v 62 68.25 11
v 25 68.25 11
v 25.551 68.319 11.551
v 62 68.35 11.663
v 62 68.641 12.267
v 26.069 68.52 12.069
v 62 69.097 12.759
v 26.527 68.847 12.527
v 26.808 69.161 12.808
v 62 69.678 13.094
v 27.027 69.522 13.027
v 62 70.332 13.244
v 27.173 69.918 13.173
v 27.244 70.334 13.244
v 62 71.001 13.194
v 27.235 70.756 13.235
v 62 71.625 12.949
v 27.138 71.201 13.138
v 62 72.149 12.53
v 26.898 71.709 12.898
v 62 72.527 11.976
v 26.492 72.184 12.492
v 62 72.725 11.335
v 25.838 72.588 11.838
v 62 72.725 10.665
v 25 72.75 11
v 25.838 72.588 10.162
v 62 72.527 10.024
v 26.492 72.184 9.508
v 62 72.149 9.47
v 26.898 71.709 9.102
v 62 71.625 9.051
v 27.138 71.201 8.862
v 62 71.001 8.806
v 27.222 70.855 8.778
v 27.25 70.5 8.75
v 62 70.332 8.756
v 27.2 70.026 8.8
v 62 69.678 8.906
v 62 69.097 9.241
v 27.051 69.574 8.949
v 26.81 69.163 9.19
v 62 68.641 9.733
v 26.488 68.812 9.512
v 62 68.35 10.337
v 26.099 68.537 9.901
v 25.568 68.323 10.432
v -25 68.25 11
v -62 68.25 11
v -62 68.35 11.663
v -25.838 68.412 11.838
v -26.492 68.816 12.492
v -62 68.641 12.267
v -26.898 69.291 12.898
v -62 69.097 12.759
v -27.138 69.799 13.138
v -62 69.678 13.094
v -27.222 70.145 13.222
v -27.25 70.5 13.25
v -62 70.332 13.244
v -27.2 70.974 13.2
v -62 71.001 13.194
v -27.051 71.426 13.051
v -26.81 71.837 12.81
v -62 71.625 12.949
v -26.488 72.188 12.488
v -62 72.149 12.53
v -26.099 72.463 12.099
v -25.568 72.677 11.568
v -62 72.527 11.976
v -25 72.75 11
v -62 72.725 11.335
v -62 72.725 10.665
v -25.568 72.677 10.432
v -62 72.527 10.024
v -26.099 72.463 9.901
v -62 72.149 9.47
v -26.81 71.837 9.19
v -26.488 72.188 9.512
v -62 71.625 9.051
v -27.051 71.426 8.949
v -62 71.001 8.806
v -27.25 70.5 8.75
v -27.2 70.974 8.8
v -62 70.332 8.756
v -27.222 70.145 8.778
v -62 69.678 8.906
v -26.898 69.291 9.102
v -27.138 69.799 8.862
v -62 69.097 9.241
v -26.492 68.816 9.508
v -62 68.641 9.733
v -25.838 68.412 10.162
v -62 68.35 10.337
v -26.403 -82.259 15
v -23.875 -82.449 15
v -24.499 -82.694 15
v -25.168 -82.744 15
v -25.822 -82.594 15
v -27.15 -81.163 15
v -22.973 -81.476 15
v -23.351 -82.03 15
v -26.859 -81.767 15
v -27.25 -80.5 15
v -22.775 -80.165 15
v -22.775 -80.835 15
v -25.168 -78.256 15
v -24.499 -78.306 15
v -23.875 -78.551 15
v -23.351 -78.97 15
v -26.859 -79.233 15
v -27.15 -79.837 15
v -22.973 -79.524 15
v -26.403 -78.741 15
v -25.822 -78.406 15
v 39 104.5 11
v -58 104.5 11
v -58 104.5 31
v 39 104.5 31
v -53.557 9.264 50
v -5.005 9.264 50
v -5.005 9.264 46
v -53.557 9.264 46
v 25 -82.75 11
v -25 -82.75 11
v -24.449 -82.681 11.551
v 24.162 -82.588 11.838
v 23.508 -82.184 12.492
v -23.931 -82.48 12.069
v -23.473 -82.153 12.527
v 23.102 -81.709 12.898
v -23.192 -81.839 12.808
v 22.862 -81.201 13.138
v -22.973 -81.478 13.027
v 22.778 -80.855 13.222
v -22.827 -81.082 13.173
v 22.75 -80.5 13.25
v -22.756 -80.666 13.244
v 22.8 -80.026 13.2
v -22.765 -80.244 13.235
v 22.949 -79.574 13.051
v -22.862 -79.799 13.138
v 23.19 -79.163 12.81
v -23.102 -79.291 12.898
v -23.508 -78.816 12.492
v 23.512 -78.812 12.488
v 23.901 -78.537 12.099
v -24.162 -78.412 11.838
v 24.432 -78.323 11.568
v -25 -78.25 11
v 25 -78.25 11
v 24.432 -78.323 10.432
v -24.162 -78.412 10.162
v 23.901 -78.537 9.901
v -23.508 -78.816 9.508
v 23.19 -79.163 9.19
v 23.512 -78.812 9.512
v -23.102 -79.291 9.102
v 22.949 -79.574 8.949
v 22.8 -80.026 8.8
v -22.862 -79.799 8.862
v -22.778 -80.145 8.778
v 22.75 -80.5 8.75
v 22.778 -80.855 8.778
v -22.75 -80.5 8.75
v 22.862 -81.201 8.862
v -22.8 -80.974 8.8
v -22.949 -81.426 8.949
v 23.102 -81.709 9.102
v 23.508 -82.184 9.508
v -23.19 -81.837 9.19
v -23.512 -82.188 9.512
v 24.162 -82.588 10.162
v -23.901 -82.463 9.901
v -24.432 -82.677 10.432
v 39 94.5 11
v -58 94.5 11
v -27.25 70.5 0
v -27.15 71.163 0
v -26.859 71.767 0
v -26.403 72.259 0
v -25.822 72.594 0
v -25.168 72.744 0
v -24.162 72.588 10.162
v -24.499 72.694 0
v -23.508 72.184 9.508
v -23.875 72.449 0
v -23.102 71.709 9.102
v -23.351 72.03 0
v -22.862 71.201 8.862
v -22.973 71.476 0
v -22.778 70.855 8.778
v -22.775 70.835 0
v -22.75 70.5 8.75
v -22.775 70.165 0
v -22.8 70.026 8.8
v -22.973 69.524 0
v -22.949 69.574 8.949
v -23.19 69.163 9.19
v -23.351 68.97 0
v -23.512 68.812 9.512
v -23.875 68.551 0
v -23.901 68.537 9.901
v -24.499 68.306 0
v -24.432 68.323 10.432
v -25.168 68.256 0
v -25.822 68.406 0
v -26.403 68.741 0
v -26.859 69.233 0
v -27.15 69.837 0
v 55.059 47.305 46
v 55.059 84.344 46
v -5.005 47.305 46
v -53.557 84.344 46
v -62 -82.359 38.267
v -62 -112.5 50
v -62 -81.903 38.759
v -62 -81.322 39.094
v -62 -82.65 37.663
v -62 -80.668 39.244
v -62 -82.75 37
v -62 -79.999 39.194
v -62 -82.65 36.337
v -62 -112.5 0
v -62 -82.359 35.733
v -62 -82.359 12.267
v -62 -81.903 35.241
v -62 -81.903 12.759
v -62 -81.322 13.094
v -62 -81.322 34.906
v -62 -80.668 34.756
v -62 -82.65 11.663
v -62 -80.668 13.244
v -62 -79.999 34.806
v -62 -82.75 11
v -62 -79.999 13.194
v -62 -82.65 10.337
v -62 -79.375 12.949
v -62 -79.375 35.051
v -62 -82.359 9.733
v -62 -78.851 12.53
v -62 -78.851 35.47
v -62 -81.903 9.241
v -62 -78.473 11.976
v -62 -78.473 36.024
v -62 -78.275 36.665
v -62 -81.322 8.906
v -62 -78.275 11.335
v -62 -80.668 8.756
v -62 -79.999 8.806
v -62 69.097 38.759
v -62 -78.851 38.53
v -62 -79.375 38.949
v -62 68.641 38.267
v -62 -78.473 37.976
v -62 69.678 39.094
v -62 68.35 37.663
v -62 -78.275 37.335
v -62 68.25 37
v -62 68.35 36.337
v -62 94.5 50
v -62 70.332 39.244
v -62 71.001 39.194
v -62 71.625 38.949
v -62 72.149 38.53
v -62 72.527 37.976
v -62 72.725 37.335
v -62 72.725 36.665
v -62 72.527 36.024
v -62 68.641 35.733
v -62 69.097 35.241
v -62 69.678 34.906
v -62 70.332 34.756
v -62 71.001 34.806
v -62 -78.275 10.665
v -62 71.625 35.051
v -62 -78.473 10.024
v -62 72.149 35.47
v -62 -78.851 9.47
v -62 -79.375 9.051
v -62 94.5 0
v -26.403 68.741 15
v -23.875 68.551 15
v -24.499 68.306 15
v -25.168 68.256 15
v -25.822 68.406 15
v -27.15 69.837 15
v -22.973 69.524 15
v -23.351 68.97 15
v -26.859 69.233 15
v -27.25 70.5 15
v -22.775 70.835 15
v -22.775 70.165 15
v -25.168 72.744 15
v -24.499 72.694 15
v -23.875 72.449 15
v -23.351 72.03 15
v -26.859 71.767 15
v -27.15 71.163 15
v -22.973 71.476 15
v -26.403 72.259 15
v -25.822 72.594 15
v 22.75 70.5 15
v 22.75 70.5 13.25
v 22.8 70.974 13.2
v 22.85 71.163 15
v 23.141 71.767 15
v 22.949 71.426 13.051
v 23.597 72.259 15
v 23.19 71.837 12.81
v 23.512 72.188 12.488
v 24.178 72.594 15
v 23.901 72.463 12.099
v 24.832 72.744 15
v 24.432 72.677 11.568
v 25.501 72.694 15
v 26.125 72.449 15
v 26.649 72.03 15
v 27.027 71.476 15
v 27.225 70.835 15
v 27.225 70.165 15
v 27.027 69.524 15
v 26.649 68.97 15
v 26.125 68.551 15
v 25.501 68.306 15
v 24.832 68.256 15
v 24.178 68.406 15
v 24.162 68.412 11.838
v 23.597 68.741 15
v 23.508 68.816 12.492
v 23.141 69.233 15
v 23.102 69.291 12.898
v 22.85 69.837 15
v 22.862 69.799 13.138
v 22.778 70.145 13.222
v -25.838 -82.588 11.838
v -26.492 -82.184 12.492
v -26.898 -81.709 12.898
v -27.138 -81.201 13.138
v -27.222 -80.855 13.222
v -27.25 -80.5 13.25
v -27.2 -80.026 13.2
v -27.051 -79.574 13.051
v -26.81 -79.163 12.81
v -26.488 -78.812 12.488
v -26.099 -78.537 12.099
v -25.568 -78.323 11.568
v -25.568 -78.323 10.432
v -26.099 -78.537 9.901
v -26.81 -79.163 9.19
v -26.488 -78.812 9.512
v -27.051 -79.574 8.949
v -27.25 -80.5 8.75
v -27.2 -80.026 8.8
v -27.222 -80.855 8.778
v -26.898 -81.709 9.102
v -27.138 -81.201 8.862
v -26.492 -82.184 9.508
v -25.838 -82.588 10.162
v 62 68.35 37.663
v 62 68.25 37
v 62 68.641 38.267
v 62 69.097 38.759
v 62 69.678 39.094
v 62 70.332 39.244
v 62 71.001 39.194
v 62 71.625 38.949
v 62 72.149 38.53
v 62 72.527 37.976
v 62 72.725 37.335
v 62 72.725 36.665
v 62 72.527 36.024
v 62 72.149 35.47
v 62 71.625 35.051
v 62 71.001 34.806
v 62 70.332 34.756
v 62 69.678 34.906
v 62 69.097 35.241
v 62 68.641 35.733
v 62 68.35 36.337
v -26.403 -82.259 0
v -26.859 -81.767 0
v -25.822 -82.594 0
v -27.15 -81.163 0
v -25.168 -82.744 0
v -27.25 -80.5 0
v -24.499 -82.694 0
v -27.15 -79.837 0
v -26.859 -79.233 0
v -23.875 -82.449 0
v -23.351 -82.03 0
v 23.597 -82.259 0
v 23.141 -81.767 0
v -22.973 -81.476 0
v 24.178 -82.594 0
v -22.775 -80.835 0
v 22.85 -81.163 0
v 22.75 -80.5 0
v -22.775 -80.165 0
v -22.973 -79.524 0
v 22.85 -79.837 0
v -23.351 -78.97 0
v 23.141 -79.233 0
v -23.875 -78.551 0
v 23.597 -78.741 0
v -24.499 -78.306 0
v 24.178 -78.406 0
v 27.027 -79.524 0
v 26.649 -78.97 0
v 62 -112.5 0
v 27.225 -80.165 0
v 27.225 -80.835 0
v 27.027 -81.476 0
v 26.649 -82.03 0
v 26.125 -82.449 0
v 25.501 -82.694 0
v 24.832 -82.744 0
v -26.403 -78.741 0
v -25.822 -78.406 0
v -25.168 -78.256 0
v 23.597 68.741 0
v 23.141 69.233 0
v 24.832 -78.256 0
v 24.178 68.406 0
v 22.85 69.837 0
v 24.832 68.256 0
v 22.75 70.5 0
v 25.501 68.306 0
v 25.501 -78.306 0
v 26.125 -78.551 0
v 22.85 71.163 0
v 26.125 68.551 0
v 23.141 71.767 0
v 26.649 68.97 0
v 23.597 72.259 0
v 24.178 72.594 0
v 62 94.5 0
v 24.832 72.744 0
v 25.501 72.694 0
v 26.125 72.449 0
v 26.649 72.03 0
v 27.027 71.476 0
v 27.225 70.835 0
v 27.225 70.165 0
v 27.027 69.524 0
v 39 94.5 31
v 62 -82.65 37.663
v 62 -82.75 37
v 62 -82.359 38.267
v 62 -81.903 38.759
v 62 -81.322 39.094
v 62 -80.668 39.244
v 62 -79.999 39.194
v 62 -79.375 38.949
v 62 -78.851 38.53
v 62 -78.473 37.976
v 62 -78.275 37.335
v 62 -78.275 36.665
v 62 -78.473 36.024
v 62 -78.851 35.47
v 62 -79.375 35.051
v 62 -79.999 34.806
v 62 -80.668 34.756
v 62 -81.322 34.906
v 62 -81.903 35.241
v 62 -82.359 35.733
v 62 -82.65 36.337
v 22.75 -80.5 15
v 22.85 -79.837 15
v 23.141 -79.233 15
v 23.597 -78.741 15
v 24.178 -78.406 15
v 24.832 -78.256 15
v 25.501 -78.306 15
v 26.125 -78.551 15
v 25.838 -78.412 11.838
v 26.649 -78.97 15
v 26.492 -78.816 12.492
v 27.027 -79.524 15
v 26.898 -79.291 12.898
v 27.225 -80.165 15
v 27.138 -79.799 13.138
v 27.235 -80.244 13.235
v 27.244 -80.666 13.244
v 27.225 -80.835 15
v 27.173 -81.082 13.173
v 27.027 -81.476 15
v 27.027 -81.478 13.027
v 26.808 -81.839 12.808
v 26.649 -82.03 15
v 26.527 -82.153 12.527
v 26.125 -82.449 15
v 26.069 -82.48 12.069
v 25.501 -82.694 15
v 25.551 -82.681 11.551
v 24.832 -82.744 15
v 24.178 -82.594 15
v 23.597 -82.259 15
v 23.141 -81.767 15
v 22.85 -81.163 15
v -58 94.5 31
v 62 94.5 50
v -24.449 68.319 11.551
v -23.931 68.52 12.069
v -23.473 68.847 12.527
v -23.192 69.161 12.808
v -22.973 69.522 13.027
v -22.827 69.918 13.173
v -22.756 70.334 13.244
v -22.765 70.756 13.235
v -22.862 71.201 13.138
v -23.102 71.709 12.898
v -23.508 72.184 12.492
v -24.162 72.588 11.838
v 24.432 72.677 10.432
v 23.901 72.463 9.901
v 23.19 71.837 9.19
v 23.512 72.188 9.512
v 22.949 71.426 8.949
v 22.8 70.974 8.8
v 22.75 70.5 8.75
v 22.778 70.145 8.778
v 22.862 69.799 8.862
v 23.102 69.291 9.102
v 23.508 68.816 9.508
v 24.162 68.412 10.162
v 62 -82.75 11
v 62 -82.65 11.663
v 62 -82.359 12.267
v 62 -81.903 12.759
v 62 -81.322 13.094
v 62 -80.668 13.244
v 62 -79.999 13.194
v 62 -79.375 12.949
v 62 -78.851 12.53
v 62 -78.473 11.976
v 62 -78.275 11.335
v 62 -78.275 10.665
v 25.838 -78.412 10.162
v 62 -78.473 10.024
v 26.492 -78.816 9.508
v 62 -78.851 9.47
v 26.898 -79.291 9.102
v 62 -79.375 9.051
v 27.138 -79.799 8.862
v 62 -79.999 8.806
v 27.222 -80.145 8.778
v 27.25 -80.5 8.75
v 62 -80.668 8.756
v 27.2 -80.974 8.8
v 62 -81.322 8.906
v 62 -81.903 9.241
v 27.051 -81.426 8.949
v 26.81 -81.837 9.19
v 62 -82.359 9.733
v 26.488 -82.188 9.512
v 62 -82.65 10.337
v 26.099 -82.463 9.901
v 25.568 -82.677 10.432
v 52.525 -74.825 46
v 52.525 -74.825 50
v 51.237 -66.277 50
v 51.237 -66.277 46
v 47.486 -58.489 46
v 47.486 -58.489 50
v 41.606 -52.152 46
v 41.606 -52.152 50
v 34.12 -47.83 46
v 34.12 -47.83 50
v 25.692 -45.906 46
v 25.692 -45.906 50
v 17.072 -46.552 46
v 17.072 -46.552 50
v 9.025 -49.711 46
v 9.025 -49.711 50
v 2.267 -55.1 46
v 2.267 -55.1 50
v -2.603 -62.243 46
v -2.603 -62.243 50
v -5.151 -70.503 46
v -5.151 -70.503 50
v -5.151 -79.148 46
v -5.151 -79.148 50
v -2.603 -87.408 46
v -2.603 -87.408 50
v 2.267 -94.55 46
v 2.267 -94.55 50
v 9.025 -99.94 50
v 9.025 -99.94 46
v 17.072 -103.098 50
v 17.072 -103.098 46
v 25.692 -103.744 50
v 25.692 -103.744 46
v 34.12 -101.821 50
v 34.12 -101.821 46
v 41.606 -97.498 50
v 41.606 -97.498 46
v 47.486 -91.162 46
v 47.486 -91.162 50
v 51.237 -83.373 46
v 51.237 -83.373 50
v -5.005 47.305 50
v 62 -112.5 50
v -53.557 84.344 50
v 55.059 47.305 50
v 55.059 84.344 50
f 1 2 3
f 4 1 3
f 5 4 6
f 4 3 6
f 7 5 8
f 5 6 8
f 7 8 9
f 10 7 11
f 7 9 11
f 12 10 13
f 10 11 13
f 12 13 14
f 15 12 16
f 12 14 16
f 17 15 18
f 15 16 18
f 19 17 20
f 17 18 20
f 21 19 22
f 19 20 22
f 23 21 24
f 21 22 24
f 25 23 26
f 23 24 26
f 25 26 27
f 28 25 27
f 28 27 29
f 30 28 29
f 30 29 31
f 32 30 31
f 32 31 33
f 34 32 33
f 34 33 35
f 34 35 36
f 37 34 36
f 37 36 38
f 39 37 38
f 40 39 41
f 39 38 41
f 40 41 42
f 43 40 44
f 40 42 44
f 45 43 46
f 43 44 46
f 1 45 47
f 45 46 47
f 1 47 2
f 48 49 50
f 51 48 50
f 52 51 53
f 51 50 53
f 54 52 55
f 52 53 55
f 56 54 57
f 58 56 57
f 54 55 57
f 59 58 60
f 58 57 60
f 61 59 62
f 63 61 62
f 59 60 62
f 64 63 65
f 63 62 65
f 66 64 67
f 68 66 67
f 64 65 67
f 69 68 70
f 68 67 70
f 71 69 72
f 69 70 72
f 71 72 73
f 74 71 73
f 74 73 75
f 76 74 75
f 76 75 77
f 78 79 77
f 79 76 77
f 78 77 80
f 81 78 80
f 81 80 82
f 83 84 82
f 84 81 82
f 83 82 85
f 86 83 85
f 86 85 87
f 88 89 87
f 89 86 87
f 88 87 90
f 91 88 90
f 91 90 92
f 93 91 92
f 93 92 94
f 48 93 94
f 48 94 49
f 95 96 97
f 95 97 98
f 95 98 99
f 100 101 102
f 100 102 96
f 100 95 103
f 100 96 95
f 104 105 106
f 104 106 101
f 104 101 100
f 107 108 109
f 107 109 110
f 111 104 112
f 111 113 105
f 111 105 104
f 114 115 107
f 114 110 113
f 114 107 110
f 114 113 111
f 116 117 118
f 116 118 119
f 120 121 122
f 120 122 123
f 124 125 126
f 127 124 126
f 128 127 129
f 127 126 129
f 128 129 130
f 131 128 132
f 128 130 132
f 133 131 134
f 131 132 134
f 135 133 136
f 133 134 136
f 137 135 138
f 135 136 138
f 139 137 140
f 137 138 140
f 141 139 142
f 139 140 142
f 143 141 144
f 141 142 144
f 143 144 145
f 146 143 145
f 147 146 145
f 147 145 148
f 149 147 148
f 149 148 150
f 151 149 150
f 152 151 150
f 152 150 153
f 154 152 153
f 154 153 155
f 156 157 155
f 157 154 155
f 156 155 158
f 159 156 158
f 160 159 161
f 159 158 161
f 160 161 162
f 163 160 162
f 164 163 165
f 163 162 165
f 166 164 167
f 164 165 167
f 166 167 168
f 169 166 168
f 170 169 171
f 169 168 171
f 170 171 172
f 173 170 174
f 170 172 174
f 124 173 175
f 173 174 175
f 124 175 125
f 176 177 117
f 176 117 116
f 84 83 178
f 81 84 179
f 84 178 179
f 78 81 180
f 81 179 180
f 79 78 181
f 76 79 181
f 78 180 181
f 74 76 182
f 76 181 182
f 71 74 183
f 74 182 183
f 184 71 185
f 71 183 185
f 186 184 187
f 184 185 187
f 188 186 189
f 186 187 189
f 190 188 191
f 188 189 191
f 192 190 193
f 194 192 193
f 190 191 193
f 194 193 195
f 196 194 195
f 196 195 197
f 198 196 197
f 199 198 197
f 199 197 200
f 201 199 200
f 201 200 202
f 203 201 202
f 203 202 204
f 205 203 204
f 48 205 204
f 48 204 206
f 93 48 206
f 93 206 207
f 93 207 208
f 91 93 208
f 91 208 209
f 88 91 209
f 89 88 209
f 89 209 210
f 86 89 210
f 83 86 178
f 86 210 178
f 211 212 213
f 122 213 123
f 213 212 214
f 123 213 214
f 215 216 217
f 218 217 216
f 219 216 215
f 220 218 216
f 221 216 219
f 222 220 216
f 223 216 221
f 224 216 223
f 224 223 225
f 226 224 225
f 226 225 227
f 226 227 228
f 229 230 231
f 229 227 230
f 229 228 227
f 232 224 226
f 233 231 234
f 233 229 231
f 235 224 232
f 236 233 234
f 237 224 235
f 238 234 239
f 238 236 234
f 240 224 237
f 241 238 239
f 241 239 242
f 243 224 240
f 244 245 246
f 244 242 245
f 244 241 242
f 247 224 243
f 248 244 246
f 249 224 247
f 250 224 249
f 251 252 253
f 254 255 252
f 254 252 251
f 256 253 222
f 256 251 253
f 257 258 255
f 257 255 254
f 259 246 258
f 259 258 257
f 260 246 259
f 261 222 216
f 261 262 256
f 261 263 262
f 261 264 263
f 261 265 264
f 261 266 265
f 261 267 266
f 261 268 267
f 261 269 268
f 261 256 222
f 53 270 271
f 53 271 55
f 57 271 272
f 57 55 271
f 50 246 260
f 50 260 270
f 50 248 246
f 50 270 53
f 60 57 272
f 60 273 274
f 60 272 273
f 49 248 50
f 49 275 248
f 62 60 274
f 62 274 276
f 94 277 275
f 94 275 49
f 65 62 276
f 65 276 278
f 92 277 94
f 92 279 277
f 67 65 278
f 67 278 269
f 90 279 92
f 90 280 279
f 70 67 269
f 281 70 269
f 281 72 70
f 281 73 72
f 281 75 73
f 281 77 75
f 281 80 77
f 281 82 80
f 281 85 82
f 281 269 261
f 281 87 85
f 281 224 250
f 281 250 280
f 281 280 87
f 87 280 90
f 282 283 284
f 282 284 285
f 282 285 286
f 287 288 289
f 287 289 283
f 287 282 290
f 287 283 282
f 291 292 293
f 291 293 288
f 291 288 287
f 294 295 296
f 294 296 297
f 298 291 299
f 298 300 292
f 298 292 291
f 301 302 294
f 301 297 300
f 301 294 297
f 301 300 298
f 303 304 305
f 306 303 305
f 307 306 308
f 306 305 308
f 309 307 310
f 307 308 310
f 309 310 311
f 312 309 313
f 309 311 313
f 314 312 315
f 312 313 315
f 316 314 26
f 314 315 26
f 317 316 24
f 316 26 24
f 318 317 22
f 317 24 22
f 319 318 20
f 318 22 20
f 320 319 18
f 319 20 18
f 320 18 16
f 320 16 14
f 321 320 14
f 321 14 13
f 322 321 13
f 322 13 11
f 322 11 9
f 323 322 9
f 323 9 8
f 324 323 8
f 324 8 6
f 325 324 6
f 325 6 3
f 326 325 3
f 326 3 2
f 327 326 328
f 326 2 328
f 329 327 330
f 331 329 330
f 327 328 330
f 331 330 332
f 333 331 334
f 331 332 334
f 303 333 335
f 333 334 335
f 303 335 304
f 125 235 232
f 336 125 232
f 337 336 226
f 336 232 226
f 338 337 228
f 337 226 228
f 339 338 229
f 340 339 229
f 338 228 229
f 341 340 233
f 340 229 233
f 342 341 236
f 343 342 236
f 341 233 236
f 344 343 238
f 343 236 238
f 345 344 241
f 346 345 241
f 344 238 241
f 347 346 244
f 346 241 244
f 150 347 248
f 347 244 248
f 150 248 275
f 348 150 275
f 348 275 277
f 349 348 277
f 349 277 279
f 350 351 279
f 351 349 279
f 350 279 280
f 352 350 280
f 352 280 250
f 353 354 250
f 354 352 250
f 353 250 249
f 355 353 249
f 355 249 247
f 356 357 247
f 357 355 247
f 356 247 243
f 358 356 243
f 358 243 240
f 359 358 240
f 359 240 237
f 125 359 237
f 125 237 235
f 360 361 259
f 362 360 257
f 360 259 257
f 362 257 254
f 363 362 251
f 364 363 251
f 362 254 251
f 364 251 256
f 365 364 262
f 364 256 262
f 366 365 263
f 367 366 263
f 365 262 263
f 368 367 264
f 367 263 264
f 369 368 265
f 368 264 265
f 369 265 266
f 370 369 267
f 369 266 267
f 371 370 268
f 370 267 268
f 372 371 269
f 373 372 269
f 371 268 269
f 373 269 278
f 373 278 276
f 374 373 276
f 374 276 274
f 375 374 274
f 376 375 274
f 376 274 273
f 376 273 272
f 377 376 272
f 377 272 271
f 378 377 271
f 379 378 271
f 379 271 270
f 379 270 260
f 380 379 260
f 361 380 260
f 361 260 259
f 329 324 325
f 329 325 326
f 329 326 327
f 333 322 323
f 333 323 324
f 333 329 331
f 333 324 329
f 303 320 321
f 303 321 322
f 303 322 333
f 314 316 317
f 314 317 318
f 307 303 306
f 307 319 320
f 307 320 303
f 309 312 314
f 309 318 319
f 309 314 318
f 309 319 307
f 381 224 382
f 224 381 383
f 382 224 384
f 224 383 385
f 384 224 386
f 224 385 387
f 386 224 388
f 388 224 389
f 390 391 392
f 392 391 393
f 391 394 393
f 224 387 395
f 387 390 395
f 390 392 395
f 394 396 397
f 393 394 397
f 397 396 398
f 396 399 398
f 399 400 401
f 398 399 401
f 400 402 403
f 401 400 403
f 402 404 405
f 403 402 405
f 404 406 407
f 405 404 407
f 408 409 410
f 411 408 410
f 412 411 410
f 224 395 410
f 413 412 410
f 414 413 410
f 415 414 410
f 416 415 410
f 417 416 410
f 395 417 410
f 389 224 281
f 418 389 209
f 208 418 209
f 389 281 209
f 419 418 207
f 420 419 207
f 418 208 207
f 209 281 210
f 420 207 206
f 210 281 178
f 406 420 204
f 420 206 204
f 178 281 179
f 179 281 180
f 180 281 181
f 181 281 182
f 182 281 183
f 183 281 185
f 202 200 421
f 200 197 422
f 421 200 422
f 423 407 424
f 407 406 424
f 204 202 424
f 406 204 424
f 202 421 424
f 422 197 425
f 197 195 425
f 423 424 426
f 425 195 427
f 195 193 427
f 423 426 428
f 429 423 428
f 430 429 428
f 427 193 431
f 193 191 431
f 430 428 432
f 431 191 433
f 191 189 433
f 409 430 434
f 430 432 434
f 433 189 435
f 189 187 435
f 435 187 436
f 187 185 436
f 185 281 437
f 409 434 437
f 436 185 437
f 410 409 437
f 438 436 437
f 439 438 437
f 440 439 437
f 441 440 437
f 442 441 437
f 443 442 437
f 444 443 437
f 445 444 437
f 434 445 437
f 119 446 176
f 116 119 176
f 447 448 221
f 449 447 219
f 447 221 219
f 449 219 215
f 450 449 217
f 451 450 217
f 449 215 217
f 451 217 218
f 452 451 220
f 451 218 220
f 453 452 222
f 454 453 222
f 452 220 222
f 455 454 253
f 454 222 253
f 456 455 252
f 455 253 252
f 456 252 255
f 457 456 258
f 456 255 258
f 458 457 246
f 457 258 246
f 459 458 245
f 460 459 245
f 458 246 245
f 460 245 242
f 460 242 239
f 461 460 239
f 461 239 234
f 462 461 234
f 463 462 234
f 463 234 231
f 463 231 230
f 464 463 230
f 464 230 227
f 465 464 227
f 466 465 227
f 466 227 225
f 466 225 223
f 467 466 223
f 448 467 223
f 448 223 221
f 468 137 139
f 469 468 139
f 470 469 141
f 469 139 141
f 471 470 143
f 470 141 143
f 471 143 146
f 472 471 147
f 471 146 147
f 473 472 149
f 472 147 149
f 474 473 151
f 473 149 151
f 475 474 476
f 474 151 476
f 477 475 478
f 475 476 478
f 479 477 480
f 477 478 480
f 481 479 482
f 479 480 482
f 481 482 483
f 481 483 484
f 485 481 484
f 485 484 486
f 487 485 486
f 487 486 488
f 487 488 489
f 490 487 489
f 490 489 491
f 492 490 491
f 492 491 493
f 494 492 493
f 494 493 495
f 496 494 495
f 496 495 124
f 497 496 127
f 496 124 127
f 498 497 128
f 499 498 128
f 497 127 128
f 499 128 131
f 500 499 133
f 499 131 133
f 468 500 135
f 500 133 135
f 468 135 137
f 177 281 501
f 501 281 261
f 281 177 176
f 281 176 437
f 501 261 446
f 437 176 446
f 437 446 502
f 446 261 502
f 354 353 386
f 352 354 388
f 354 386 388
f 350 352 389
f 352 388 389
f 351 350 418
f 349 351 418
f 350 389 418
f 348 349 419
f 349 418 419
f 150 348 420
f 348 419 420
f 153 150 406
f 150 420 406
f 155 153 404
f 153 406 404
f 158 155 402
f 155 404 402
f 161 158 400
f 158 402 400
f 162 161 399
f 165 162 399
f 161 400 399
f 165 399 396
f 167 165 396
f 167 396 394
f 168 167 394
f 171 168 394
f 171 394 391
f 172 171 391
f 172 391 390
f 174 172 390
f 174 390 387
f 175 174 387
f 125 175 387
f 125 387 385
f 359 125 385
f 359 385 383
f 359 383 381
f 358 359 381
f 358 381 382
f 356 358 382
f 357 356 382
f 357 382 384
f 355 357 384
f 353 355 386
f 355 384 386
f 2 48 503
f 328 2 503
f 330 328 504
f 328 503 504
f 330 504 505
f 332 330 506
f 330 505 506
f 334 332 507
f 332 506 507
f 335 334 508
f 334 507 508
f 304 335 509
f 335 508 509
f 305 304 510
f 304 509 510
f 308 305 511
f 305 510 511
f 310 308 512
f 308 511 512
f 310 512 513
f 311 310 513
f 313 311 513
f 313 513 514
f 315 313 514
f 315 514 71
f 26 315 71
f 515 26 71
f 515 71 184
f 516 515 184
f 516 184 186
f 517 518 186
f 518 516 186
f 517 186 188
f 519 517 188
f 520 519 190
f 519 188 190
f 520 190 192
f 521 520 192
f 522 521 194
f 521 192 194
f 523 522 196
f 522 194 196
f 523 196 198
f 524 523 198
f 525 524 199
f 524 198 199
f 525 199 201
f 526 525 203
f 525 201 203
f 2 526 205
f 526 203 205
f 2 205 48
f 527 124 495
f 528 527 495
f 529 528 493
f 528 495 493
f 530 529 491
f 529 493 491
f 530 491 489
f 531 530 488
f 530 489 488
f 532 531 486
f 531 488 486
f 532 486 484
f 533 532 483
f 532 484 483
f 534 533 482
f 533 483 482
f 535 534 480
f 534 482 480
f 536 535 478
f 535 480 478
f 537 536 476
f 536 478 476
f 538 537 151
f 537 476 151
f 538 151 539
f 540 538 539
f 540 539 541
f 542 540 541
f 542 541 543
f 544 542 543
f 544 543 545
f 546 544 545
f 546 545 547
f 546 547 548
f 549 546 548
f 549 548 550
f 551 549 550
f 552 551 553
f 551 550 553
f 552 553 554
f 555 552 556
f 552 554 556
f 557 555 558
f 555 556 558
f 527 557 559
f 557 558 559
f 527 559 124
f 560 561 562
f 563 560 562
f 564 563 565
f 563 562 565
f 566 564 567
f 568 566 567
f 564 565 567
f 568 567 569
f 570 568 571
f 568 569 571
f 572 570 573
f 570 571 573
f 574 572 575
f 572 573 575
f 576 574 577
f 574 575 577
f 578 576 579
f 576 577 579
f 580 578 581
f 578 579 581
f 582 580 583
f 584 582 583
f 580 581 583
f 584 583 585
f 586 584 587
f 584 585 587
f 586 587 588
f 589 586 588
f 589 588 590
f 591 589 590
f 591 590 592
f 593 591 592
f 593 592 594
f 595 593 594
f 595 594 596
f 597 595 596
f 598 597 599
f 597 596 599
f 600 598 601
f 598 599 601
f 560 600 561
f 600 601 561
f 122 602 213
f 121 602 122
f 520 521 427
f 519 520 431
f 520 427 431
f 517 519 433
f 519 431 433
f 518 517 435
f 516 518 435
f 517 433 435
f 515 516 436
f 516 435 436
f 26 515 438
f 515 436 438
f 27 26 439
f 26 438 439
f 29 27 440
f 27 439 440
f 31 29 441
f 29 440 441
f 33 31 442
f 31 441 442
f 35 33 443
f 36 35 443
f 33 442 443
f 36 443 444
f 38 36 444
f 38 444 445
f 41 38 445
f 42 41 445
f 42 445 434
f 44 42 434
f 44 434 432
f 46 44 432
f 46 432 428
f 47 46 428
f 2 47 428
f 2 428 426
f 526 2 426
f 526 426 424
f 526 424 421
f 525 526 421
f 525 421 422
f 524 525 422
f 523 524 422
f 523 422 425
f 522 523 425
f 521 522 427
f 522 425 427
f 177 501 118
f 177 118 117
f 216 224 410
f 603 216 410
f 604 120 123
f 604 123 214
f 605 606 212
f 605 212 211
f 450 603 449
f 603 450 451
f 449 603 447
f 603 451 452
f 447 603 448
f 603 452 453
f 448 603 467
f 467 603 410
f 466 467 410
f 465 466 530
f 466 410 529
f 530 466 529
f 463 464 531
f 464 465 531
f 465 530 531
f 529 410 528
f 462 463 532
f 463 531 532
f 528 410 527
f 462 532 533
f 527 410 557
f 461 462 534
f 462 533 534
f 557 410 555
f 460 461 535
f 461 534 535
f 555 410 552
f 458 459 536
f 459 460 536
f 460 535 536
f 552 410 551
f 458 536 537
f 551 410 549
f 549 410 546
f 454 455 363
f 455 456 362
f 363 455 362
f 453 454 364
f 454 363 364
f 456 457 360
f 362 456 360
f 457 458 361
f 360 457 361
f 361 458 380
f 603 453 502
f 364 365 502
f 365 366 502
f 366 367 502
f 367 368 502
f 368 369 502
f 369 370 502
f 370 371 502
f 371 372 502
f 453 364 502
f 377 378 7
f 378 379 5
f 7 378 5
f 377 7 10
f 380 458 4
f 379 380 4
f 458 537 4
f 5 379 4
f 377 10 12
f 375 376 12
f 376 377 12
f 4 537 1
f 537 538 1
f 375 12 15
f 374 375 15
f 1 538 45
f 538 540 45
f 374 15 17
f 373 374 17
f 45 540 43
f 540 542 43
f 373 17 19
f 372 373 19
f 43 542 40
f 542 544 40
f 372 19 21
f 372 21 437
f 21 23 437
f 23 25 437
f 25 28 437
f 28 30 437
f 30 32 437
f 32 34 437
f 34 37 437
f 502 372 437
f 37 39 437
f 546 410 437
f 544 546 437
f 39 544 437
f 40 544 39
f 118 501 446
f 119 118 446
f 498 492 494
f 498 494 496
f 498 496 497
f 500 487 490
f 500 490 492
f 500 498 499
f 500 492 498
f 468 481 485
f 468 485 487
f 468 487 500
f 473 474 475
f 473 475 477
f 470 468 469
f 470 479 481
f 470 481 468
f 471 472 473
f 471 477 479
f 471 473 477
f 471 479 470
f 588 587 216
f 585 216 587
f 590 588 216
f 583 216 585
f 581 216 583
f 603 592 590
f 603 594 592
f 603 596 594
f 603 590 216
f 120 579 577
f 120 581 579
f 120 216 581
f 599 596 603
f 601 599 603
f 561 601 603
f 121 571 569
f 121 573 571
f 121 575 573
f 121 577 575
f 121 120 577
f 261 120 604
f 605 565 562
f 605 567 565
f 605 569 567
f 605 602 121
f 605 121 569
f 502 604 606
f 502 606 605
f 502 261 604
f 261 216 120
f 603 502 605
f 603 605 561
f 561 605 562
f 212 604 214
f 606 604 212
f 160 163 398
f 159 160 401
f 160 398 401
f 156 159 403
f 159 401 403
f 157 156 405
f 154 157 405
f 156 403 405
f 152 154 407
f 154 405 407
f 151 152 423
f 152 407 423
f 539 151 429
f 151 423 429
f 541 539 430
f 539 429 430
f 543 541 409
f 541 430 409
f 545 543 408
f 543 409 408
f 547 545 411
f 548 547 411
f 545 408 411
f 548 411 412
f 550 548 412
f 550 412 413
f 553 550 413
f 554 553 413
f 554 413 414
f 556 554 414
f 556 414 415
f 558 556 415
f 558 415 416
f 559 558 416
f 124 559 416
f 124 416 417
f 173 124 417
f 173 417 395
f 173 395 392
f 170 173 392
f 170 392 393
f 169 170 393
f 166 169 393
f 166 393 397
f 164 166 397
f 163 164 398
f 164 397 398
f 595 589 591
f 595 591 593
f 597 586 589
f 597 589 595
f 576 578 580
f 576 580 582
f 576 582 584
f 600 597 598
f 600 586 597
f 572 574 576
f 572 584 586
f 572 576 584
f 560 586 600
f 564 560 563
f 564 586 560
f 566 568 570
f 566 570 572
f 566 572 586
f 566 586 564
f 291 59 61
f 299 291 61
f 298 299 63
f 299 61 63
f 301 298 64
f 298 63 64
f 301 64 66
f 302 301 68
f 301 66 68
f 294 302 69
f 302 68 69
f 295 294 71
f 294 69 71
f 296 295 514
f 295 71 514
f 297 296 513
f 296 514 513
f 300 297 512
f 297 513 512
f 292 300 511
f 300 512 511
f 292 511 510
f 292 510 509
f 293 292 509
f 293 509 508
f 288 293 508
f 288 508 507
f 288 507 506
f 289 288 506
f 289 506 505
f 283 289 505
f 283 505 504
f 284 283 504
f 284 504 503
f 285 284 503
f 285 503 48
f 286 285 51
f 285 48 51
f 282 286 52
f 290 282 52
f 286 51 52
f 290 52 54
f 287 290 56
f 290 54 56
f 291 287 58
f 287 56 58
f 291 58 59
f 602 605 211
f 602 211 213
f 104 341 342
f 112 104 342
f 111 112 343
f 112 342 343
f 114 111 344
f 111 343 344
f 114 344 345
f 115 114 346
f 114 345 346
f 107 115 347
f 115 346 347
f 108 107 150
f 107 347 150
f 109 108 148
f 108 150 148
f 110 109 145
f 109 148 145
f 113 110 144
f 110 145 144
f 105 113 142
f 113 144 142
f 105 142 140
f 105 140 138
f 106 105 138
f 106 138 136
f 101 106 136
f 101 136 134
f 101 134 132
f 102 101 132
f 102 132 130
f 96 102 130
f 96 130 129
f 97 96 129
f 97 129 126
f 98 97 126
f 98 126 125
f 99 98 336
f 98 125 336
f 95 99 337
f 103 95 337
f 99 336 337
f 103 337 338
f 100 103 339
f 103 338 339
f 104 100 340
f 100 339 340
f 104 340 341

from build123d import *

# Parameters (mm, degrees)
SKETCH1_W           = 124
SKETCH1_H           = 225
BOSS_EXTRUDE1_DEPTH = 50
SKETCH2_W           = 142.142792237
SKETCH2_H           = 18
CUT_EXTRUDE1_DEPTH  = 50
SKETCH3_W           = 97
SKETCH3_H           = 20
BOSS_EXTRUDE2_DEPTH = 10
SKETCH4_R           = 29
CUT_EXTRUDE3_DEPTH  = 4
SKETCH5_R           = 2.25
CUT_EXTRUDE4_DEPTH  = 15
SKETCH6_R           = 2.25
CUT_EXTRUDE5_DEPTH  = 175.734799053


with BuildPart() as part:
    # Sketch1 → Boss-Extrude1 (new body)
    with BuildSketch(Plane.XY):
        Rectangle(SKETCH1_W, SKETCH1_H)
    extrude(amount=BOSS_EXTRUDE1_DEPTH)

    # Sketch2 → Cut-Extrude1 (cut)
    with BuildSketch(Plane.XY.offset(50)):
        with Locations((-0.947920956, 103.5)):
            Rectangle(SKETCH2_W, SKETCH2_H)
    extrude(amount=-CUT_EXTRUDE1_DEPTH, mode=Mode.SUBTRACT)

    # Sketch3 → Boss-Extrude2 (add)
    with BuildSketch(Plane(origin=(0, 94.5, 0), x_dir=(1, 0, 0), z_dir=(0, 1, 0))):
        with Locations((-9.5, -21)):
            Rectangle(SKETCH3_W, SKETCH3_H)
    extrude(amount=BOSS_EXTRUDE2_DEPTH)

    # Sketch4 → Cut-Extrude3 (cut)
    with BuildSketch(Plane.XY.offset(50)):
        with Locations((23.52502673, -74.82534643)):
            Circle(SKETCH4_R)
        Polygon((-53.556975746, 84.343983357), (55.058573197, 84.343983357), (55.058573197, 47.30457957), (-5.005324836, 47.30457957), (-5.005324836, 9.264110816), (-53.556975746, 9.264110816), align=None)
    extrude(amount=-CUT_EXTRUDE3_DEPTH, mode=Mode.SUBTRACT)

    # Sketch5 → Cut-Extrude4 (cut)
    with BuildSketch(Plane(origin=(0, 0, 0), x_dir=(-1, 0, 0), z_dir=(0, 0, -1))):
        with Locations((-25, 70.5)):
            Circle(SKETCH5_R)
        with Locations((25, 70.5)):
            Circle(SKETCH5_R)
        with Locations((25, -80.5)):
            Circle(SKETCH5_R)
        with Locations((-25, -80.5)):
            Circle(SKETCH5_R)
    extrude(amount=-CUT_EXTRUDE4_DEPTH, mode=Mode.SUBTRACT)

    # Sketch6 → Cut-Extrude5 (cut, through all)
    with BuildSketch(Plane.ZY.offset(62)):
        with Locations(Location((11, 70.5, 0), (0, 0, 270))):
            Circle(SKETCH6_R)
        with Locations(Location((37, 70.5, 0), (0, 0, 270))):
            Circle(SKETCH6_R)
        with Locations(Location((37, -80.5, 0), (0, 0, 270))):
            Circle(SKETCH6_R)
        with Locations(Location((11, -80.5, 0), (0, 0, 270))):
            Circle(SKETCH6_R)
    extrude(amount=-CUT_EXTRUDE5_DEPTH, mode=Mode.SUBTRACT)


solid = part.part
